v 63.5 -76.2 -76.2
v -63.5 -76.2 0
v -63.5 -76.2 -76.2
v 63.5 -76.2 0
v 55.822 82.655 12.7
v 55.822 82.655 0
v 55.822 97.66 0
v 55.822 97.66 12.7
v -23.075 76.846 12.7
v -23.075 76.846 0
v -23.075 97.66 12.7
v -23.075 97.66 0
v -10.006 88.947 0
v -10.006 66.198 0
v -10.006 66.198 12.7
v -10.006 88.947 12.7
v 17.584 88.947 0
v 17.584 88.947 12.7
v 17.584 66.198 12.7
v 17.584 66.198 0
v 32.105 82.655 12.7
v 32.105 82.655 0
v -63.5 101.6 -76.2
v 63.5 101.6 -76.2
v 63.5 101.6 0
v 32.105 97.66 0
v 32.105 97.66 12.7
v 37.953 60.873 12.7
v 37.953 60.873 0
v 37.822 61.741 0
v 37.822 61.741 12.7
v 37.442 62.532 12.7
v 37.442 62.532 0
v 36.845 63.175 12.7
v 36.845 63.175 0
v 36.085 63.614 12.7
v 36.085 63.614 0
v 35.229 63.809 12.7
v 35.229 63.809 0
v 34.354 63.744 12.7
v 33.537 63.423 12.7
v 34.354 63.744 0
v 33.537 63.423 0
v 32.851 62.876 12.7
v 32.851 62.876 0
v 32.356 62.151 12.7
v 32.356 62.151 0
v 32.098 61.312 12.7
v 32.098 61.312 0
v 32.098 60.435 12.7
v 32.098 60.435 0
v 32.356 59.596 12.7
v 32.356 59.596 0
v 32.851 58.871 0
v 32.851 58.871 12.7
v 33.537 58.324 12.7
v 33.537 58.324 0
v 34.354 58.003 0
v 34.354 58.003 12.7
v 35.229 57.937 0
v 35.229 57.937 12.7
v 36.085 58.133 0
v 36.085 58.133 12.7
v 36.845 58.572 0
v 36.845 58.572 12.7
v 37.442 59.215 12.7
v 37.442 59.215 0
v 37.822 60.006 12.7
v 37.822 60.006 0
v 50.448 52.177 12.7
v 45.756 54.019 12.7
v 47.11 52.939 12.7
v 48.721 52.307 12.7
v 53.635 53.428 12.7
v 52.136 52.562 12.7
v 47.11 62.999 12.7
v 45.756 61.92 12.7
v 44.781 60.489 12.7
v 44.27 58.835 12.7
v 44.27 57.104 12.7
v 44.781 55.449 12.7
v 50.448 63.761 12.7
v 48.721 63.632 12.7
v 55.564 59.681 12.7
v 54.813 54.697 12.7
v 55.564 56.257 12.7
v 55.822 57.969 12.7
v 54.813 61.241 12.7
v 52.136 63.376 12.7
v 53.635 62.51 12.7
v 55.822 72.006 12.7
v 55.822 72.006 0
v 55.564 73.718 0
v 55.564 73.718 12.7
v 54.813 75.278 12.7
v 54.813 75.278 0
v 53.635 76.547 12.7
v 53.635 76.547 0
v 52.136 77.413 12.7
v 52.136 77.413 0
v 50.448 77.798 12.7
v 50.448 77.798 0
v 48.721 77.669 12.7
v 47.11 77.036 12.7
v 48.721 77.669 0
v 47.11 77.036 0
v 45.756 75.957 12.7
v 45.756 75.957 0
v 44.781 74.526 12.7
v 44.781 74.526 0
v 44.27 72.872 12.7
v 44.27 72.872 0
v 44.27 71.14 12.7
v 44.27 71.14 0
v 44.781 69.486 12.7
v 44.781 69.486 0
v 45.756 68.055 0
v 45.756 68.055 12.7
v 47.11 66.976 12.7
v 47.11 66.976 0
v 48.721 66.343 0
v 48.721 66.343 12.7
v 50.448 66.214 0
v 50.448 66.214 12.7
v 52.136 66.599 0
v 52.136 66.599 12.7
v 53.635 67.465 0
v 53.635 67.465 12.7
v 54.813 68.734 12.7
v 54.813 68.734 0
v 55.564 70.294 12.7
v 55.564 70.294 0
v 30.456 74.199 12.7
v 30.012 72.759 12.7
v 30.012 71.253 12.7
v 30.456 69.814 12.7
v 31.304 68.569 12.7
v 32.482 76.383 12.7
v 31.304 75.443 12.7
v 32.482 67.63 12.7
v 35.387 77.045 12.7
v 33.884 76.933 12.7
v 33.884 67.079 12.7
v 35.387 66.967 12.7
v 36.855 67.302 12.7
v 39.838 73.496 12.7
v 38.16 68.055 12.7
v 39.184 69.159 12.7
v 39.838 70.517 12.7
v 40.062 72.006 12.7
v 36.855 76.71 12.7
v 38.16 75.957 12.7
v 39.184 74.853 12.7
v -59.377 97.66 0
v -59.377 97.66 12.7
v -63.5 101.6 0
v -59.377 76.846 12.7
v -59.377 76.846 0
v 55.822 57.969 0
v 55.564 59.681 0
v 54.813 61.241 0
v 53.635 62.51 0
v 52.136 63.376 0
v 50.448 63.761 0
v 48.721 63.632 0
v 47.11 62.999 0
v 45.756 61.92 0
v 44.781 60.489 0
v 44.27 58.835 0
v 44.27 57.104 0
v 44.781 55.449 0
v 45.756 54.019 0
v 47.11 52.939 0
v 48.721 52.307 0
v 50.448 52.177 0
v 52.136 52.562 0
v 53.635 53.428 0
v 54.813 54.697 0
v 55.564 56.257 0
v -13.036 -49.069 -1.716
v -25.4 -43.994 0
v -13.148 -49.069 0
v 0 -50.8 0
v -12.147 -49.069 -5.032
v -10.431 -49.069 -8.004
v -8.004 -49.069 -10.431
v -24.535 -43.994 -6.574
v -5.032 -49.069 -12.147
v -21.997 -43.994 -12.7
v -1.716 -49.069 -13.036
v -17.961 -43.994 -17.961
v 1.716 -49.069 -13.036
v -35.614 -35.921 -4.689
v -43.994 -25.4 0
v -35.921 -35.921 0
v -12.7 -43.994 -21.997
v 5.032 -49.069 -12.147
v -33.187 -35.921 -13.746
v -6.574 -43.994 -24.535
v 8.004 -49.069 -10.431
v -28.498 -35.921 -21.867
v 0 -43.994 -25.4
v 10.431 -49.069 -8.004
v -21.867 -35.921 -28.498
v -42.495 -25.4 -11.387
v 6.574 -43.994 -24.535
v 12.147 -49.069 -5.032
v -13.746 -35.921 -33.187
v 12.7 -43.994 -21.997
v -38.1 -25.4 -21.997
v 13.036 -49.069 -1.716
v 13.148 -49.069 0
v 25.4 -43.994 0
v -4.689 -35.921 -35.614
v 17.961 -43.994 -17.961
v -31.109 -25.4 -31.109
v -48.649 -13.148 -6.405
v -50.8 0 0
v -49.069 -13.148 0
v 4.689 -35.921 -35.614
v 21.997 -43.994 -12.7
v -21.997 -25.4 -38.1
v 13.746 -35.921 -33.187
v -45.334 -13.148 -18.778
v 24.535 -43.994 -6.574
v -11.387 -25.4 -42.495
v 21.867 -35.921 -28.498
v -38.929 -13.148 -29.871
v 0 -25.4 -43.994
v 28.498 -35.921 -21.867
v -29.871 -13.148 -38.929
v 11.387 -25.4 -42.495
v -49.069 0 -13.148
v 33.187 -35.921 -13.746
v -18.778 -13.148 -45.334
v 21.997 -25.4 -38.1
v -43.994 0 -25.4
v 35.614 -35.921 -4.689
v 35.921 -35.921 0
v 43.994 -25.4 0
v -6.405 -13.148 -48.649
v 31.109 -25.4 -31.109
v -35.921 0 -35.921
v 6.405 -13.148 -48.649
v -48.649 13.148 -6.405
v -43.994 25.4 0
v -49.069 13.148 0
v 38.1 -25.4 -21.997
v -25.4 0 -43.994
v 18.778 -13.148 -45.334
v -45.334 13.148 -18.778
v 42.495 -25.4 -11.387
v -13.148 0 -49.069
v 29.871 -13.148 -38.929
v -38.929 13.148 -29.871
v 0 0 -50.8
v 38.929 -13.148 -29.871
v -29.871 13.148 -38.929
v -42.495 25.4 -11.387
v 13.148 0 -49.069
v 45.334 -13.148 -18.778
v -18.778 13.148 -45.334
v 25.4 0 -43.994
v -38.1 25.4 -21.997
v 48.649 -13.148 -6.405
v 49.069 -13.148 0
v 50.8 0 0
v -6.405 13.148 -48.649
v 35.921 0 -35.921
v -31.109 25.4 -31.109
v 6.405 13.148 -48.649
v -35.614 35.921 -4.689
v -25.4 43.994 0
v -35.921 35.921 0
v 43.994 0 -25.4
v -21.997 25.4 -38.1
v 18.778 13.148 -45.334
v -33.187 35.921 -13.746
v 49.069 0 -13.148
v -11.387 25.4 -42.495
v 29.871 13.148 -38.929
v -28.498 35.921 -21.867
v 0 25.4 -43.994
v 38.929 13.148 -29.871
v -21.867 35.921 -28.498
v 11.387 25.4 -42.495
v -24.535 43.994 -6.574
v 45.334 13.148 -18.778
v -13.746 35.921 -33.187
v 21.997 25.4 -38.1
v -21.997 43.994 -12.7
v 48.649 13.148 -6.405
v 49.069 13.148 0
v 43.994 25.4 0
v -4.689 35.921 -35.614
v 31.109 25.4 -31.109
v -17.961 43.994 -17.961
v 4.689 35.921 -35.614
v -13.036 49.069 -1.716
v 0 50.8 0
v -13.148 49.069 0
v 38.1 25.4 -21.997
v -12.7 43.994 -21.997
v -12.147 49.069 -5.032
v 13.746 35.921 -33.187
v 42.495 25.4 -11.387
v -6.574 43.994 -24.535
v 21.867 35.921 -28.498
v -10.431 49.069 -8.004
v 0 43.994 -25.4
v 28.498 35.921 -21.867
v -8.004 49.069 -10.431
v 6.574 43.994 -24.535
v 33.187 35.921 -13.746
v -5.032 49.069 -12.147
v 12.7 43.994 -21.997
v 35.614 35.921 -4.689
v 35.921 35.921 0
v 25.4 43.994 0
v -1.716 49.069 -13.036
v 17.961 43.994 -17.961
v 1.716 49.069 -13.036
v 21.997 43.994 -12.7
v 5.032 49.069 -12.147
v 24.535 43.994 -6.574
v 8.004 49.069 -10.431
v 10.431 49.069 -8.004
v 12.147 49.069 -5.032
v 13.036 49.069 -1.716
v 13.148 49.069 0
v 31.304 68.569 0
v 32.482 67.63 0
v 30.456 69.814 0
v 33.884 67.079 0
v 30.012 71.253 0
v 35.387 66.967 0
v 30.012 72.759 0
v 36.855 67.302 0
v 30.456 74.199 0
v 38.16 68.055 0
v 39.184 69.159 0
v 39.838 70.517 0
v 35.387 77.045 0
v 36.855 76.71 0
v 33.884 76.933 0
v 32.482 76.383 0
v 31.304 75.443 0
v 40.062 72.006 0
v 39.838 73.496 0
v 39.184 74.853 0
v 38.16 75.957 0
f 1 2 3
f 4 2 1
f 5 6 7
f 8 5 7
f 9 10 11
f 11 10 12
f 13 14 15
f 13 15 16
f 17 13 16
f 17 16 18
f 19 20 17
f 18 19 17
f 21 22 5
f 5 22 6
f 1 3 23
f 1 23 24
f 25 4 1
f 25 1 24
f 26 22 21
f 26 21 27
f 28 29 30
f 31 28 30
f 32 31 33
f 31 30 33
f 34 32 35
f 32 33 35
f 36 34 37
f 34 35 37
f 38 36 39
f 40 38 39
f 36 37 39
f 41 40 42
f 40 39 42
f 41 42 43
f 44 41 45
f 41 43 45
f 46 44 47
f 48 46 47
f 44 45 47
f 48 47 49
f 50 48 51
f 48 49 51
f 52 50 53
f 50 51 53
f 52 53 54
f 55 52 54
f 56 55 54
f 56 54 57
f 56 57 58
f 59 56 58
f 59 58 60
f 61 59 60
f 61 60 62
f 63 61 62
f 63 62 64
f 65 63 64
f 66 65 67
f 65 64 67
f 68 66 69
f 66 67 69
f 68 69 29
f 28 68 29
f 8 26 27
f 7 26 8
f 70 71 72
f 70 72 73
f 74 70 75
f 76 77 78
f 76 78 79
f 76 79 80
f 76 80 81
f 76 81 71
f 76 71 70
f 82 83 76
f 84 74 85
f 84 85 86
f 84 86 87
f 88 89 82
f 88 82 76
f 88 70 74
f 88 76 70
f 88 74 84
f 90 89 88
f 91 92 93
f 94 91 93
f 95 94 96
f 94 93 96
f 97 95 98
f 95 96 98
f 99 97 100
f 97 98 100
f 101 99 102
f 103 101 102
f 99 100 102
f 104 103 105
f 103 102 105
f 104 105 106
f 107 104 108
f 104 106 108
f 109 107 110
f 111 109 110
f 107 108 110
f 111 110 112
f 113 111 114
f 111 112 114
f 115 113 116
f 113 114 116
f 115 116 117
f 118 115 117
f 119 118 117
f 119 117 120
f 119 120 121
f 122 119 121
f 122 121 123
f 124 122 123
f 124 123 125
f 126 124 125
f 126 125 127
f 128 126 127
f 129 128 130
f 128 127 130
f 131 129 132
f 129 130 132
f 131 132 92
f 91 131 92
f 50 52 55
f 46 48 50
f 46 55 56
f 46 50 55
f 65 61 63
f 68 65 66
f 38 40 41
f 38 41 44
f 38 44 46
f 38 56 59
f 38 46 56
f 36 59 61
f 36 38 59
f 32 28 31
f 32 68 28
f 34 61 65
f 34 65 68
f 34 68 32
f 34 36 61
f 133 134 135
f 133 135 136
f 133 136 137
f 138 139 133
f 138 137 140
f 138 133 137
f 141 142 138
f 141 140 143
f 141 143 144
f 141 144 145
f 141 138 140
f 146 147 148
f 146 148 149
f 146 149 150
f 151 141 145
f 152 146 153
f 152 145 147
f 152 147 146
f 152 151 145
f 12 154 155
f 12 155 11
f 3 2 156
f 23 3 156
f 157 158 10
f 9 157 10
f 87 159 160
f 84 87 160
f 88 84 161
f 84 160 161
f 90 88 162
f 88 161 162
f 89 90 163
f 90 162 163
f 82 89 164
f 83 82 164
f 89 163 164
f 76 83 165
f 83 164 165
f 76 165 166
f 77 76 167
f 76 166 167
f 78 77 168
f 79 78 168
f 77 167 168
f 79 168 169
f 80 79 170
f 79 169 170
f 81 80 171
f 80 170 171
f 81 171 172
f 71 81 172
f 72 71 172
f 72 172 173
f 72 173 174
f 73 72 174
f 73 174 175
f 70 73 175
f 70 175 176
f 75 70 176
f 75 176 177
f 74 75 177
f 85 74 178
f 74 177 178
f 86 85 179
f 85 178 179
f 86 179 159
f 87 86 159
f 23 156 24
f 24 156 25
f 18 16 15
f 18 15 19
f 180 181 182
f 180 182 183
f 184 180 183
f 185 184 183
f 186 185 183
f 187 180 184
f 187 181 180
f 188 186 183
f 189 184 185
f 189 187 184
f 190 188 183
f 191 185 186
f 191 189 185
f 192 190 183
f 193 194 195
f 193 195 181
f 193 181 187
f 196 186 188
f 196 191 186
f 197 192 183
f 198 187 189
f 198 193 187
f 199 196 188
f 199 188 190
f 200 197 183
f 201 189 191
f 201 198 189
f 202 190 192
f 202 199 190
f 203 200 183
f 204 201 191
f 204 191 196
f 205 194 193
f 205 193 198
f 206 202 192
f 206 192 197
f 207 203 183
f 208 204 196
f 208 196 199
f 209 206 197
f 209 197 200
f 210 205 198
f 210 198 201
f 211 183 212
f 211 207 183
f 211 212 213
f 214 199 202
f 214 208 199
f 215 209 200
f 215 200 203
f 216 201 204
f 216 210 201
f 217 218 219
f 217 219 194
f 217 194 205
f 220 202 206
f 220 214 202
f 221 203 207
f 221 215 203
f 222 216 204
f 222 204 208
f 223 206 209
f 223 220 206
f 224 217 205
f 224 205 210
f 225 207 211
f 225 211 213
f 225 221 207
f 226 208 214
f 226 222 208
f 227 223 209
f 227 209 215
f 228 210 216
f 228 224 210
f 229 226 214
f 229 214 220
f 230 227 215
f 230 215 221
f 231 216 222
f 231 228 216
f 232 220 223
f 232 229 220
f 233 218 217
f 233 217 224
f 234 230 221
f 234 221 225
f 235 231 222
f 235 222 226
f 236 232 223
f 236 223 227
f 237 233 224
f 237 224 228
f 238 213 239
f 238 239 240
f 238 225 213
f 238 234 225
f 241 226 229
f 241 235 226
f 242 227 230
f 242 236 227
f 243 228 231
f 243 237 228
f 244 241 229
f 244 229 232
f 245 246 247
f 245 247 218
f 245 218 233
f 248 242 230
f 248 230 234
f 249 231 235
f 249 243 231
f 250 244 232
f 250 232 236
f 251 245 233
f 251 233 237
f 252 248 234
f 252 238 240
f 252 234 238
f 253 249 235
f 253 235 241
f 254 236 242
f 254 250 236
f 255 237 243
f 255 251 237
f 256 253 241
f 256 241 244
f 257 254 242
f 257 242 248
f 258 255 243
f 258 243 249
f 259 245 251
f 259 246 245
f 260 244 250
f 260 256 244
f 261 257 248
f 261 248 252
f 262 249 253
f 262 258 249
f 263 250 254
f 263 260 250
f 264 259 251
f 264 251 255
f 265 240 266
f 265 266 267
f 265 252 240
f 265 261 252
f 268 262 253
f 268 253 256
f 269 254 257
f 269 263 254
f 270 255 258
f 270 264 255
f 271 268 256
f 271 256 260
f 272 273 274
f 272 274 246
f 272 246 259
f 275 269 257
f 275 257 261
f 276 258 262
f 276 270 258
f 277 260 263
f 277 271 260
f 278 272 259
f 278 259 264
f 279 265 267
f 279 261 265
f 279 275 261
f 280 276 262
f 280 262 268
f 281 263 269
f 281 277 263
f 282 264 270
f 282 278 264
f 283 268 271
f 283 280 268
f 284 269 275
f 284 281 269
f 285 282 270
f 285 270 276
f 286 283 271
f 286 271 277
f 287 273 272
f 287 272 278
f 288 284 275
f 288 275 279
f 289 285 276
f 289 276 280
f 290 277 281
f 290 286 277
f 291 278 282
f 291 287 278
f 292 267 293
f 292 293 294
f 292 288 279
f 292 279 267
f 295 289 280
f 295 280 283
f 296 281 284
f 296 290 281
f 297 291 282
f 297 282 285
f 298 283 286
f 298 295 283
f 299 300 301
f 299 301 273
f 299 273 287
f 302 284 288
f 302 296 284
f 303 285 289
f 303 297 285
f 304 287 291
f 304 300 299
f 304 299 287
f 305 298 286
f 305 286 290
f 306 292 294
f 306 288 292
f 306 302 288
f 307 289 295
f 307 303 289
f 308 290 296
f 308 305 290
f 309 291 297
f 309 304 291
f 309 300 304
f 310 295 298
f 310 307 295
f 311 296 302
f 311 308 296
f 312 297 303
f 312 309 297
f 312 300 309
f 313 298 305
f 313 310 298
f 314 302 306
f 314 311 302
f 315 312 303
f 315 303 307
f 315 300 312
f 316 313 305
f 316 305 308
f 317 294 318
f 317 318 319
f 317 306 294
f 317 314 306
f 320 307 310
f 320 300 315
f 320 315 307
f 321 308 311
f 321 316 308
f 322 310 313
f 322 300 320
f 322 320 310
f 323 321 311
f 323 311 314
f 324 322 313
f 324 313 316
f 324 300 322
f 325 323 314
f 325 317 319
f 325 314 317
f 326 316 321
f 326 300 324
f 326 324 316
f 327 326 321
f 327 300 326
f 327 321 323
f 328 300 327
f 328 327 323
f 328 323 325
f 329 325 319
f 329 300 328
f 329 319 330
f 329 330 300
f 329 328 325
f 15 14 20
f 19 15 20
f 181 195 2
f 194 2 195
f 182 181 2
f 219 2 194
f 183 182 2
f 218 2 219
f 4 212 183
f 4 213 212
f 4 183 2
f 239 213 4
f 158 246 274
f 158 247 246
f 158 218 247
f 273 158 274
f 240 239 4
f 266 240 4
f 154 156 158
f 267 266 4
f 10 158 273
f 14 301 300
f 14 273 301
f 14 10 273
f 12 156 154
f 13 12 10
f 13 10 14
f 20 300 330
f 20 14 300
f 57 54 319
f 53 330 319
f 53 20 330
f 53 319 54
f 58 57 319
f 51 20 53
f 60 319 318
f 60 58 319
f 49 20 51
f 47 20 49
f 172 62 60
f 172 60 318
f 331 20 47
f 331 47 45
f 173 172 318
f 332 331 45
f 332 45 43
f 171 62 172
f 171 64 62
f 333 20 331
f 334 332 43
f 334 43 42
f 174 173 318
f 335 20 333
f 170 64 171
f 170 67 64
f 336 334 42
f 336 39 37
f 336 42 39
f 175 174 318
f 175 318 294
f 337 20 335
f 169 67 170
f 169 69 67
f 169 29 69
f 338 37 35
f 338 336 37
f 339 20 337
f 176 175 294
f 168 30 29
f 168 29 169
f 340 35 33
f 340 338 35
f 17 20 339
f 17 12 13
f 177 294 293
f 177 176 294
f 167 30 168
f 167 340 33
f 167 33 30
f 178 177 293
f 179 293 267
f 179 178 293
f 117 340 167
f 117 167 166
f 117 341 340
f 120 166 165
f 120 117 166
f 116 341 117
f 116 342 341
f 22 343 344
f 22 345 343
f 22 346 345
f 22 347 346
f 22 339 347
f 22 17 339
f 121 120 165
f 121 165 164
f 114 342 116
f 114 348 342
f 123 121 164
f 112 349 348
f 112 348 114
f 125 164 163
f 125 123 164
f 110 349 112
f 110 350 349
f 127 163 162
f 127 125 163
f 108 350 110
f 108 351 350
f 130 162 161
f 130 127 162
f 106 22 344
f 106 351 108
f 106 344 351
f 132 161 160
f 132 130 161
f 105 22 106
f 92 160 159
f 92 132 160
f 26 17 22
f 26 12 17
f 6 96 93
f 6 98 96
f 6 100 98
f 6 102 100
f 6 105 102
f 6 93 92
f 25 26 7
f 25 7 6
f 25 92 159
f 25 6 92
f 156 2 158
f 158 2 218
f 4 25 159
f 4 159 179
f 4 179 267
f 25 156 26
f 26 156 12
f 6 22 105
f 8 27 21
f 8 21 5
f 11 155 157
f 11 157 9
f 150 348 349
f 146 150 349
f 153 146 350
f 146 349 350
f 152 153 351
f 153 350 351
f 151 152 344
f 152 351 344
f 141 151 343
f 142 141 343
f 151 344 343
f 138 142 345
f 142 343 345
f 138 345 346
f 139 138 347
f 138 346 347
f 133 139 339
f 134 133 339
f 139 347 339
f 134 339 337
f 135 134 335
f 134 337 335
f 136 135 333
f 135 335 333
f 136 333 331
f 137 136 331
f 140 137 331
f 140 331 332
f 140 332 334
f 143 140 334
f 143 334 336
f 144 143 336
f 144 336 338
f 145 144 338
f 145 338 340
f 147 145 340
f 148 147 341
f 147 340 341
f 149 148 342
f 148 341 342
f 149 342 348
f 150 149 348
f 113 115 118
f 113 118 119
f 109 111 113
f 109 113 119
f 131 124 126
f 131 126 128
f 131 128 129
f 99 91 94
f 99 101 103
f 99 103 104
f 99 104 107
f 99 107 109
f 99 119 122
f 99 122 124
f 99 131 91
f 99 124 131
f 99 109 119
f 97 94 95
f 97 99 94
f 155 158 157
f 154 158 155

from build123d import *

# Parameters (mm, degrees)
F0_W     = 127
F0_H     = 177.8
F1_DEPTH = 76.2
F4_W     = 36.302225
F4_H     = 20.813279
F4_W_2   = 27.589691
F4_H_2   = 22.749387
F4_W_3   = 23.717456
F4_H_3   = 15.004918
F4_R     = 5.053417
F4_R_2   = 5.808353
F4_R_3   = 2.944236
F4_R_4   = 5.808361
F5_DEPTH = 12.7


with BuildPart() as f1:
    # F0 (on Top) → F1 (new body)
    with BuildSketch(Plane.XY):
        with Locations((0, 12.7)):
            Rectangle(F0_W, F0_H)
    extrude(amount=-F1_DEPTH)

    # F2 (on face) → F3 (revolve, cut)
    with BuildSketch(Plane.XY):
        with BuildLine():
            Line((0, 50.8), (0, -50.8))
            ThreePointArc((0, -50.8), (50.8, 0), (0, 50.8))
        make_face()
    revolve(axis=Axis((0, 0, 0), (0, -1, 0)), mode=Mode.SUBTRACT)

    # F4 (on face) → F5 (join)
    with BuildSketch(Plane.XY):
        with Locations((-41.225782, 87.253075)):
            Rectangle(F4_W, F4_H)
        with Locations((3.788977, 77.572484)):
            Rectangle(F4_W_2, F4_H_2)
        with Locations((43.96344, 90.157256)):
            Rectangle(F4_W_3, F4_H_3)
        with Locations((35.008892, 72.006144)):
            Circle(F4_R)
        with Locations((50.013807, 72.006144)):
            Circle(F4_R_2)
        with Locations((35.008892, 60.87346)):
            Circle(F4_R_3)
        with Locations((50.013807, 57.969283)):
            Circle(F4_R_4)
    extrude(amount=F5_DEPTH)


solid = f1.part
